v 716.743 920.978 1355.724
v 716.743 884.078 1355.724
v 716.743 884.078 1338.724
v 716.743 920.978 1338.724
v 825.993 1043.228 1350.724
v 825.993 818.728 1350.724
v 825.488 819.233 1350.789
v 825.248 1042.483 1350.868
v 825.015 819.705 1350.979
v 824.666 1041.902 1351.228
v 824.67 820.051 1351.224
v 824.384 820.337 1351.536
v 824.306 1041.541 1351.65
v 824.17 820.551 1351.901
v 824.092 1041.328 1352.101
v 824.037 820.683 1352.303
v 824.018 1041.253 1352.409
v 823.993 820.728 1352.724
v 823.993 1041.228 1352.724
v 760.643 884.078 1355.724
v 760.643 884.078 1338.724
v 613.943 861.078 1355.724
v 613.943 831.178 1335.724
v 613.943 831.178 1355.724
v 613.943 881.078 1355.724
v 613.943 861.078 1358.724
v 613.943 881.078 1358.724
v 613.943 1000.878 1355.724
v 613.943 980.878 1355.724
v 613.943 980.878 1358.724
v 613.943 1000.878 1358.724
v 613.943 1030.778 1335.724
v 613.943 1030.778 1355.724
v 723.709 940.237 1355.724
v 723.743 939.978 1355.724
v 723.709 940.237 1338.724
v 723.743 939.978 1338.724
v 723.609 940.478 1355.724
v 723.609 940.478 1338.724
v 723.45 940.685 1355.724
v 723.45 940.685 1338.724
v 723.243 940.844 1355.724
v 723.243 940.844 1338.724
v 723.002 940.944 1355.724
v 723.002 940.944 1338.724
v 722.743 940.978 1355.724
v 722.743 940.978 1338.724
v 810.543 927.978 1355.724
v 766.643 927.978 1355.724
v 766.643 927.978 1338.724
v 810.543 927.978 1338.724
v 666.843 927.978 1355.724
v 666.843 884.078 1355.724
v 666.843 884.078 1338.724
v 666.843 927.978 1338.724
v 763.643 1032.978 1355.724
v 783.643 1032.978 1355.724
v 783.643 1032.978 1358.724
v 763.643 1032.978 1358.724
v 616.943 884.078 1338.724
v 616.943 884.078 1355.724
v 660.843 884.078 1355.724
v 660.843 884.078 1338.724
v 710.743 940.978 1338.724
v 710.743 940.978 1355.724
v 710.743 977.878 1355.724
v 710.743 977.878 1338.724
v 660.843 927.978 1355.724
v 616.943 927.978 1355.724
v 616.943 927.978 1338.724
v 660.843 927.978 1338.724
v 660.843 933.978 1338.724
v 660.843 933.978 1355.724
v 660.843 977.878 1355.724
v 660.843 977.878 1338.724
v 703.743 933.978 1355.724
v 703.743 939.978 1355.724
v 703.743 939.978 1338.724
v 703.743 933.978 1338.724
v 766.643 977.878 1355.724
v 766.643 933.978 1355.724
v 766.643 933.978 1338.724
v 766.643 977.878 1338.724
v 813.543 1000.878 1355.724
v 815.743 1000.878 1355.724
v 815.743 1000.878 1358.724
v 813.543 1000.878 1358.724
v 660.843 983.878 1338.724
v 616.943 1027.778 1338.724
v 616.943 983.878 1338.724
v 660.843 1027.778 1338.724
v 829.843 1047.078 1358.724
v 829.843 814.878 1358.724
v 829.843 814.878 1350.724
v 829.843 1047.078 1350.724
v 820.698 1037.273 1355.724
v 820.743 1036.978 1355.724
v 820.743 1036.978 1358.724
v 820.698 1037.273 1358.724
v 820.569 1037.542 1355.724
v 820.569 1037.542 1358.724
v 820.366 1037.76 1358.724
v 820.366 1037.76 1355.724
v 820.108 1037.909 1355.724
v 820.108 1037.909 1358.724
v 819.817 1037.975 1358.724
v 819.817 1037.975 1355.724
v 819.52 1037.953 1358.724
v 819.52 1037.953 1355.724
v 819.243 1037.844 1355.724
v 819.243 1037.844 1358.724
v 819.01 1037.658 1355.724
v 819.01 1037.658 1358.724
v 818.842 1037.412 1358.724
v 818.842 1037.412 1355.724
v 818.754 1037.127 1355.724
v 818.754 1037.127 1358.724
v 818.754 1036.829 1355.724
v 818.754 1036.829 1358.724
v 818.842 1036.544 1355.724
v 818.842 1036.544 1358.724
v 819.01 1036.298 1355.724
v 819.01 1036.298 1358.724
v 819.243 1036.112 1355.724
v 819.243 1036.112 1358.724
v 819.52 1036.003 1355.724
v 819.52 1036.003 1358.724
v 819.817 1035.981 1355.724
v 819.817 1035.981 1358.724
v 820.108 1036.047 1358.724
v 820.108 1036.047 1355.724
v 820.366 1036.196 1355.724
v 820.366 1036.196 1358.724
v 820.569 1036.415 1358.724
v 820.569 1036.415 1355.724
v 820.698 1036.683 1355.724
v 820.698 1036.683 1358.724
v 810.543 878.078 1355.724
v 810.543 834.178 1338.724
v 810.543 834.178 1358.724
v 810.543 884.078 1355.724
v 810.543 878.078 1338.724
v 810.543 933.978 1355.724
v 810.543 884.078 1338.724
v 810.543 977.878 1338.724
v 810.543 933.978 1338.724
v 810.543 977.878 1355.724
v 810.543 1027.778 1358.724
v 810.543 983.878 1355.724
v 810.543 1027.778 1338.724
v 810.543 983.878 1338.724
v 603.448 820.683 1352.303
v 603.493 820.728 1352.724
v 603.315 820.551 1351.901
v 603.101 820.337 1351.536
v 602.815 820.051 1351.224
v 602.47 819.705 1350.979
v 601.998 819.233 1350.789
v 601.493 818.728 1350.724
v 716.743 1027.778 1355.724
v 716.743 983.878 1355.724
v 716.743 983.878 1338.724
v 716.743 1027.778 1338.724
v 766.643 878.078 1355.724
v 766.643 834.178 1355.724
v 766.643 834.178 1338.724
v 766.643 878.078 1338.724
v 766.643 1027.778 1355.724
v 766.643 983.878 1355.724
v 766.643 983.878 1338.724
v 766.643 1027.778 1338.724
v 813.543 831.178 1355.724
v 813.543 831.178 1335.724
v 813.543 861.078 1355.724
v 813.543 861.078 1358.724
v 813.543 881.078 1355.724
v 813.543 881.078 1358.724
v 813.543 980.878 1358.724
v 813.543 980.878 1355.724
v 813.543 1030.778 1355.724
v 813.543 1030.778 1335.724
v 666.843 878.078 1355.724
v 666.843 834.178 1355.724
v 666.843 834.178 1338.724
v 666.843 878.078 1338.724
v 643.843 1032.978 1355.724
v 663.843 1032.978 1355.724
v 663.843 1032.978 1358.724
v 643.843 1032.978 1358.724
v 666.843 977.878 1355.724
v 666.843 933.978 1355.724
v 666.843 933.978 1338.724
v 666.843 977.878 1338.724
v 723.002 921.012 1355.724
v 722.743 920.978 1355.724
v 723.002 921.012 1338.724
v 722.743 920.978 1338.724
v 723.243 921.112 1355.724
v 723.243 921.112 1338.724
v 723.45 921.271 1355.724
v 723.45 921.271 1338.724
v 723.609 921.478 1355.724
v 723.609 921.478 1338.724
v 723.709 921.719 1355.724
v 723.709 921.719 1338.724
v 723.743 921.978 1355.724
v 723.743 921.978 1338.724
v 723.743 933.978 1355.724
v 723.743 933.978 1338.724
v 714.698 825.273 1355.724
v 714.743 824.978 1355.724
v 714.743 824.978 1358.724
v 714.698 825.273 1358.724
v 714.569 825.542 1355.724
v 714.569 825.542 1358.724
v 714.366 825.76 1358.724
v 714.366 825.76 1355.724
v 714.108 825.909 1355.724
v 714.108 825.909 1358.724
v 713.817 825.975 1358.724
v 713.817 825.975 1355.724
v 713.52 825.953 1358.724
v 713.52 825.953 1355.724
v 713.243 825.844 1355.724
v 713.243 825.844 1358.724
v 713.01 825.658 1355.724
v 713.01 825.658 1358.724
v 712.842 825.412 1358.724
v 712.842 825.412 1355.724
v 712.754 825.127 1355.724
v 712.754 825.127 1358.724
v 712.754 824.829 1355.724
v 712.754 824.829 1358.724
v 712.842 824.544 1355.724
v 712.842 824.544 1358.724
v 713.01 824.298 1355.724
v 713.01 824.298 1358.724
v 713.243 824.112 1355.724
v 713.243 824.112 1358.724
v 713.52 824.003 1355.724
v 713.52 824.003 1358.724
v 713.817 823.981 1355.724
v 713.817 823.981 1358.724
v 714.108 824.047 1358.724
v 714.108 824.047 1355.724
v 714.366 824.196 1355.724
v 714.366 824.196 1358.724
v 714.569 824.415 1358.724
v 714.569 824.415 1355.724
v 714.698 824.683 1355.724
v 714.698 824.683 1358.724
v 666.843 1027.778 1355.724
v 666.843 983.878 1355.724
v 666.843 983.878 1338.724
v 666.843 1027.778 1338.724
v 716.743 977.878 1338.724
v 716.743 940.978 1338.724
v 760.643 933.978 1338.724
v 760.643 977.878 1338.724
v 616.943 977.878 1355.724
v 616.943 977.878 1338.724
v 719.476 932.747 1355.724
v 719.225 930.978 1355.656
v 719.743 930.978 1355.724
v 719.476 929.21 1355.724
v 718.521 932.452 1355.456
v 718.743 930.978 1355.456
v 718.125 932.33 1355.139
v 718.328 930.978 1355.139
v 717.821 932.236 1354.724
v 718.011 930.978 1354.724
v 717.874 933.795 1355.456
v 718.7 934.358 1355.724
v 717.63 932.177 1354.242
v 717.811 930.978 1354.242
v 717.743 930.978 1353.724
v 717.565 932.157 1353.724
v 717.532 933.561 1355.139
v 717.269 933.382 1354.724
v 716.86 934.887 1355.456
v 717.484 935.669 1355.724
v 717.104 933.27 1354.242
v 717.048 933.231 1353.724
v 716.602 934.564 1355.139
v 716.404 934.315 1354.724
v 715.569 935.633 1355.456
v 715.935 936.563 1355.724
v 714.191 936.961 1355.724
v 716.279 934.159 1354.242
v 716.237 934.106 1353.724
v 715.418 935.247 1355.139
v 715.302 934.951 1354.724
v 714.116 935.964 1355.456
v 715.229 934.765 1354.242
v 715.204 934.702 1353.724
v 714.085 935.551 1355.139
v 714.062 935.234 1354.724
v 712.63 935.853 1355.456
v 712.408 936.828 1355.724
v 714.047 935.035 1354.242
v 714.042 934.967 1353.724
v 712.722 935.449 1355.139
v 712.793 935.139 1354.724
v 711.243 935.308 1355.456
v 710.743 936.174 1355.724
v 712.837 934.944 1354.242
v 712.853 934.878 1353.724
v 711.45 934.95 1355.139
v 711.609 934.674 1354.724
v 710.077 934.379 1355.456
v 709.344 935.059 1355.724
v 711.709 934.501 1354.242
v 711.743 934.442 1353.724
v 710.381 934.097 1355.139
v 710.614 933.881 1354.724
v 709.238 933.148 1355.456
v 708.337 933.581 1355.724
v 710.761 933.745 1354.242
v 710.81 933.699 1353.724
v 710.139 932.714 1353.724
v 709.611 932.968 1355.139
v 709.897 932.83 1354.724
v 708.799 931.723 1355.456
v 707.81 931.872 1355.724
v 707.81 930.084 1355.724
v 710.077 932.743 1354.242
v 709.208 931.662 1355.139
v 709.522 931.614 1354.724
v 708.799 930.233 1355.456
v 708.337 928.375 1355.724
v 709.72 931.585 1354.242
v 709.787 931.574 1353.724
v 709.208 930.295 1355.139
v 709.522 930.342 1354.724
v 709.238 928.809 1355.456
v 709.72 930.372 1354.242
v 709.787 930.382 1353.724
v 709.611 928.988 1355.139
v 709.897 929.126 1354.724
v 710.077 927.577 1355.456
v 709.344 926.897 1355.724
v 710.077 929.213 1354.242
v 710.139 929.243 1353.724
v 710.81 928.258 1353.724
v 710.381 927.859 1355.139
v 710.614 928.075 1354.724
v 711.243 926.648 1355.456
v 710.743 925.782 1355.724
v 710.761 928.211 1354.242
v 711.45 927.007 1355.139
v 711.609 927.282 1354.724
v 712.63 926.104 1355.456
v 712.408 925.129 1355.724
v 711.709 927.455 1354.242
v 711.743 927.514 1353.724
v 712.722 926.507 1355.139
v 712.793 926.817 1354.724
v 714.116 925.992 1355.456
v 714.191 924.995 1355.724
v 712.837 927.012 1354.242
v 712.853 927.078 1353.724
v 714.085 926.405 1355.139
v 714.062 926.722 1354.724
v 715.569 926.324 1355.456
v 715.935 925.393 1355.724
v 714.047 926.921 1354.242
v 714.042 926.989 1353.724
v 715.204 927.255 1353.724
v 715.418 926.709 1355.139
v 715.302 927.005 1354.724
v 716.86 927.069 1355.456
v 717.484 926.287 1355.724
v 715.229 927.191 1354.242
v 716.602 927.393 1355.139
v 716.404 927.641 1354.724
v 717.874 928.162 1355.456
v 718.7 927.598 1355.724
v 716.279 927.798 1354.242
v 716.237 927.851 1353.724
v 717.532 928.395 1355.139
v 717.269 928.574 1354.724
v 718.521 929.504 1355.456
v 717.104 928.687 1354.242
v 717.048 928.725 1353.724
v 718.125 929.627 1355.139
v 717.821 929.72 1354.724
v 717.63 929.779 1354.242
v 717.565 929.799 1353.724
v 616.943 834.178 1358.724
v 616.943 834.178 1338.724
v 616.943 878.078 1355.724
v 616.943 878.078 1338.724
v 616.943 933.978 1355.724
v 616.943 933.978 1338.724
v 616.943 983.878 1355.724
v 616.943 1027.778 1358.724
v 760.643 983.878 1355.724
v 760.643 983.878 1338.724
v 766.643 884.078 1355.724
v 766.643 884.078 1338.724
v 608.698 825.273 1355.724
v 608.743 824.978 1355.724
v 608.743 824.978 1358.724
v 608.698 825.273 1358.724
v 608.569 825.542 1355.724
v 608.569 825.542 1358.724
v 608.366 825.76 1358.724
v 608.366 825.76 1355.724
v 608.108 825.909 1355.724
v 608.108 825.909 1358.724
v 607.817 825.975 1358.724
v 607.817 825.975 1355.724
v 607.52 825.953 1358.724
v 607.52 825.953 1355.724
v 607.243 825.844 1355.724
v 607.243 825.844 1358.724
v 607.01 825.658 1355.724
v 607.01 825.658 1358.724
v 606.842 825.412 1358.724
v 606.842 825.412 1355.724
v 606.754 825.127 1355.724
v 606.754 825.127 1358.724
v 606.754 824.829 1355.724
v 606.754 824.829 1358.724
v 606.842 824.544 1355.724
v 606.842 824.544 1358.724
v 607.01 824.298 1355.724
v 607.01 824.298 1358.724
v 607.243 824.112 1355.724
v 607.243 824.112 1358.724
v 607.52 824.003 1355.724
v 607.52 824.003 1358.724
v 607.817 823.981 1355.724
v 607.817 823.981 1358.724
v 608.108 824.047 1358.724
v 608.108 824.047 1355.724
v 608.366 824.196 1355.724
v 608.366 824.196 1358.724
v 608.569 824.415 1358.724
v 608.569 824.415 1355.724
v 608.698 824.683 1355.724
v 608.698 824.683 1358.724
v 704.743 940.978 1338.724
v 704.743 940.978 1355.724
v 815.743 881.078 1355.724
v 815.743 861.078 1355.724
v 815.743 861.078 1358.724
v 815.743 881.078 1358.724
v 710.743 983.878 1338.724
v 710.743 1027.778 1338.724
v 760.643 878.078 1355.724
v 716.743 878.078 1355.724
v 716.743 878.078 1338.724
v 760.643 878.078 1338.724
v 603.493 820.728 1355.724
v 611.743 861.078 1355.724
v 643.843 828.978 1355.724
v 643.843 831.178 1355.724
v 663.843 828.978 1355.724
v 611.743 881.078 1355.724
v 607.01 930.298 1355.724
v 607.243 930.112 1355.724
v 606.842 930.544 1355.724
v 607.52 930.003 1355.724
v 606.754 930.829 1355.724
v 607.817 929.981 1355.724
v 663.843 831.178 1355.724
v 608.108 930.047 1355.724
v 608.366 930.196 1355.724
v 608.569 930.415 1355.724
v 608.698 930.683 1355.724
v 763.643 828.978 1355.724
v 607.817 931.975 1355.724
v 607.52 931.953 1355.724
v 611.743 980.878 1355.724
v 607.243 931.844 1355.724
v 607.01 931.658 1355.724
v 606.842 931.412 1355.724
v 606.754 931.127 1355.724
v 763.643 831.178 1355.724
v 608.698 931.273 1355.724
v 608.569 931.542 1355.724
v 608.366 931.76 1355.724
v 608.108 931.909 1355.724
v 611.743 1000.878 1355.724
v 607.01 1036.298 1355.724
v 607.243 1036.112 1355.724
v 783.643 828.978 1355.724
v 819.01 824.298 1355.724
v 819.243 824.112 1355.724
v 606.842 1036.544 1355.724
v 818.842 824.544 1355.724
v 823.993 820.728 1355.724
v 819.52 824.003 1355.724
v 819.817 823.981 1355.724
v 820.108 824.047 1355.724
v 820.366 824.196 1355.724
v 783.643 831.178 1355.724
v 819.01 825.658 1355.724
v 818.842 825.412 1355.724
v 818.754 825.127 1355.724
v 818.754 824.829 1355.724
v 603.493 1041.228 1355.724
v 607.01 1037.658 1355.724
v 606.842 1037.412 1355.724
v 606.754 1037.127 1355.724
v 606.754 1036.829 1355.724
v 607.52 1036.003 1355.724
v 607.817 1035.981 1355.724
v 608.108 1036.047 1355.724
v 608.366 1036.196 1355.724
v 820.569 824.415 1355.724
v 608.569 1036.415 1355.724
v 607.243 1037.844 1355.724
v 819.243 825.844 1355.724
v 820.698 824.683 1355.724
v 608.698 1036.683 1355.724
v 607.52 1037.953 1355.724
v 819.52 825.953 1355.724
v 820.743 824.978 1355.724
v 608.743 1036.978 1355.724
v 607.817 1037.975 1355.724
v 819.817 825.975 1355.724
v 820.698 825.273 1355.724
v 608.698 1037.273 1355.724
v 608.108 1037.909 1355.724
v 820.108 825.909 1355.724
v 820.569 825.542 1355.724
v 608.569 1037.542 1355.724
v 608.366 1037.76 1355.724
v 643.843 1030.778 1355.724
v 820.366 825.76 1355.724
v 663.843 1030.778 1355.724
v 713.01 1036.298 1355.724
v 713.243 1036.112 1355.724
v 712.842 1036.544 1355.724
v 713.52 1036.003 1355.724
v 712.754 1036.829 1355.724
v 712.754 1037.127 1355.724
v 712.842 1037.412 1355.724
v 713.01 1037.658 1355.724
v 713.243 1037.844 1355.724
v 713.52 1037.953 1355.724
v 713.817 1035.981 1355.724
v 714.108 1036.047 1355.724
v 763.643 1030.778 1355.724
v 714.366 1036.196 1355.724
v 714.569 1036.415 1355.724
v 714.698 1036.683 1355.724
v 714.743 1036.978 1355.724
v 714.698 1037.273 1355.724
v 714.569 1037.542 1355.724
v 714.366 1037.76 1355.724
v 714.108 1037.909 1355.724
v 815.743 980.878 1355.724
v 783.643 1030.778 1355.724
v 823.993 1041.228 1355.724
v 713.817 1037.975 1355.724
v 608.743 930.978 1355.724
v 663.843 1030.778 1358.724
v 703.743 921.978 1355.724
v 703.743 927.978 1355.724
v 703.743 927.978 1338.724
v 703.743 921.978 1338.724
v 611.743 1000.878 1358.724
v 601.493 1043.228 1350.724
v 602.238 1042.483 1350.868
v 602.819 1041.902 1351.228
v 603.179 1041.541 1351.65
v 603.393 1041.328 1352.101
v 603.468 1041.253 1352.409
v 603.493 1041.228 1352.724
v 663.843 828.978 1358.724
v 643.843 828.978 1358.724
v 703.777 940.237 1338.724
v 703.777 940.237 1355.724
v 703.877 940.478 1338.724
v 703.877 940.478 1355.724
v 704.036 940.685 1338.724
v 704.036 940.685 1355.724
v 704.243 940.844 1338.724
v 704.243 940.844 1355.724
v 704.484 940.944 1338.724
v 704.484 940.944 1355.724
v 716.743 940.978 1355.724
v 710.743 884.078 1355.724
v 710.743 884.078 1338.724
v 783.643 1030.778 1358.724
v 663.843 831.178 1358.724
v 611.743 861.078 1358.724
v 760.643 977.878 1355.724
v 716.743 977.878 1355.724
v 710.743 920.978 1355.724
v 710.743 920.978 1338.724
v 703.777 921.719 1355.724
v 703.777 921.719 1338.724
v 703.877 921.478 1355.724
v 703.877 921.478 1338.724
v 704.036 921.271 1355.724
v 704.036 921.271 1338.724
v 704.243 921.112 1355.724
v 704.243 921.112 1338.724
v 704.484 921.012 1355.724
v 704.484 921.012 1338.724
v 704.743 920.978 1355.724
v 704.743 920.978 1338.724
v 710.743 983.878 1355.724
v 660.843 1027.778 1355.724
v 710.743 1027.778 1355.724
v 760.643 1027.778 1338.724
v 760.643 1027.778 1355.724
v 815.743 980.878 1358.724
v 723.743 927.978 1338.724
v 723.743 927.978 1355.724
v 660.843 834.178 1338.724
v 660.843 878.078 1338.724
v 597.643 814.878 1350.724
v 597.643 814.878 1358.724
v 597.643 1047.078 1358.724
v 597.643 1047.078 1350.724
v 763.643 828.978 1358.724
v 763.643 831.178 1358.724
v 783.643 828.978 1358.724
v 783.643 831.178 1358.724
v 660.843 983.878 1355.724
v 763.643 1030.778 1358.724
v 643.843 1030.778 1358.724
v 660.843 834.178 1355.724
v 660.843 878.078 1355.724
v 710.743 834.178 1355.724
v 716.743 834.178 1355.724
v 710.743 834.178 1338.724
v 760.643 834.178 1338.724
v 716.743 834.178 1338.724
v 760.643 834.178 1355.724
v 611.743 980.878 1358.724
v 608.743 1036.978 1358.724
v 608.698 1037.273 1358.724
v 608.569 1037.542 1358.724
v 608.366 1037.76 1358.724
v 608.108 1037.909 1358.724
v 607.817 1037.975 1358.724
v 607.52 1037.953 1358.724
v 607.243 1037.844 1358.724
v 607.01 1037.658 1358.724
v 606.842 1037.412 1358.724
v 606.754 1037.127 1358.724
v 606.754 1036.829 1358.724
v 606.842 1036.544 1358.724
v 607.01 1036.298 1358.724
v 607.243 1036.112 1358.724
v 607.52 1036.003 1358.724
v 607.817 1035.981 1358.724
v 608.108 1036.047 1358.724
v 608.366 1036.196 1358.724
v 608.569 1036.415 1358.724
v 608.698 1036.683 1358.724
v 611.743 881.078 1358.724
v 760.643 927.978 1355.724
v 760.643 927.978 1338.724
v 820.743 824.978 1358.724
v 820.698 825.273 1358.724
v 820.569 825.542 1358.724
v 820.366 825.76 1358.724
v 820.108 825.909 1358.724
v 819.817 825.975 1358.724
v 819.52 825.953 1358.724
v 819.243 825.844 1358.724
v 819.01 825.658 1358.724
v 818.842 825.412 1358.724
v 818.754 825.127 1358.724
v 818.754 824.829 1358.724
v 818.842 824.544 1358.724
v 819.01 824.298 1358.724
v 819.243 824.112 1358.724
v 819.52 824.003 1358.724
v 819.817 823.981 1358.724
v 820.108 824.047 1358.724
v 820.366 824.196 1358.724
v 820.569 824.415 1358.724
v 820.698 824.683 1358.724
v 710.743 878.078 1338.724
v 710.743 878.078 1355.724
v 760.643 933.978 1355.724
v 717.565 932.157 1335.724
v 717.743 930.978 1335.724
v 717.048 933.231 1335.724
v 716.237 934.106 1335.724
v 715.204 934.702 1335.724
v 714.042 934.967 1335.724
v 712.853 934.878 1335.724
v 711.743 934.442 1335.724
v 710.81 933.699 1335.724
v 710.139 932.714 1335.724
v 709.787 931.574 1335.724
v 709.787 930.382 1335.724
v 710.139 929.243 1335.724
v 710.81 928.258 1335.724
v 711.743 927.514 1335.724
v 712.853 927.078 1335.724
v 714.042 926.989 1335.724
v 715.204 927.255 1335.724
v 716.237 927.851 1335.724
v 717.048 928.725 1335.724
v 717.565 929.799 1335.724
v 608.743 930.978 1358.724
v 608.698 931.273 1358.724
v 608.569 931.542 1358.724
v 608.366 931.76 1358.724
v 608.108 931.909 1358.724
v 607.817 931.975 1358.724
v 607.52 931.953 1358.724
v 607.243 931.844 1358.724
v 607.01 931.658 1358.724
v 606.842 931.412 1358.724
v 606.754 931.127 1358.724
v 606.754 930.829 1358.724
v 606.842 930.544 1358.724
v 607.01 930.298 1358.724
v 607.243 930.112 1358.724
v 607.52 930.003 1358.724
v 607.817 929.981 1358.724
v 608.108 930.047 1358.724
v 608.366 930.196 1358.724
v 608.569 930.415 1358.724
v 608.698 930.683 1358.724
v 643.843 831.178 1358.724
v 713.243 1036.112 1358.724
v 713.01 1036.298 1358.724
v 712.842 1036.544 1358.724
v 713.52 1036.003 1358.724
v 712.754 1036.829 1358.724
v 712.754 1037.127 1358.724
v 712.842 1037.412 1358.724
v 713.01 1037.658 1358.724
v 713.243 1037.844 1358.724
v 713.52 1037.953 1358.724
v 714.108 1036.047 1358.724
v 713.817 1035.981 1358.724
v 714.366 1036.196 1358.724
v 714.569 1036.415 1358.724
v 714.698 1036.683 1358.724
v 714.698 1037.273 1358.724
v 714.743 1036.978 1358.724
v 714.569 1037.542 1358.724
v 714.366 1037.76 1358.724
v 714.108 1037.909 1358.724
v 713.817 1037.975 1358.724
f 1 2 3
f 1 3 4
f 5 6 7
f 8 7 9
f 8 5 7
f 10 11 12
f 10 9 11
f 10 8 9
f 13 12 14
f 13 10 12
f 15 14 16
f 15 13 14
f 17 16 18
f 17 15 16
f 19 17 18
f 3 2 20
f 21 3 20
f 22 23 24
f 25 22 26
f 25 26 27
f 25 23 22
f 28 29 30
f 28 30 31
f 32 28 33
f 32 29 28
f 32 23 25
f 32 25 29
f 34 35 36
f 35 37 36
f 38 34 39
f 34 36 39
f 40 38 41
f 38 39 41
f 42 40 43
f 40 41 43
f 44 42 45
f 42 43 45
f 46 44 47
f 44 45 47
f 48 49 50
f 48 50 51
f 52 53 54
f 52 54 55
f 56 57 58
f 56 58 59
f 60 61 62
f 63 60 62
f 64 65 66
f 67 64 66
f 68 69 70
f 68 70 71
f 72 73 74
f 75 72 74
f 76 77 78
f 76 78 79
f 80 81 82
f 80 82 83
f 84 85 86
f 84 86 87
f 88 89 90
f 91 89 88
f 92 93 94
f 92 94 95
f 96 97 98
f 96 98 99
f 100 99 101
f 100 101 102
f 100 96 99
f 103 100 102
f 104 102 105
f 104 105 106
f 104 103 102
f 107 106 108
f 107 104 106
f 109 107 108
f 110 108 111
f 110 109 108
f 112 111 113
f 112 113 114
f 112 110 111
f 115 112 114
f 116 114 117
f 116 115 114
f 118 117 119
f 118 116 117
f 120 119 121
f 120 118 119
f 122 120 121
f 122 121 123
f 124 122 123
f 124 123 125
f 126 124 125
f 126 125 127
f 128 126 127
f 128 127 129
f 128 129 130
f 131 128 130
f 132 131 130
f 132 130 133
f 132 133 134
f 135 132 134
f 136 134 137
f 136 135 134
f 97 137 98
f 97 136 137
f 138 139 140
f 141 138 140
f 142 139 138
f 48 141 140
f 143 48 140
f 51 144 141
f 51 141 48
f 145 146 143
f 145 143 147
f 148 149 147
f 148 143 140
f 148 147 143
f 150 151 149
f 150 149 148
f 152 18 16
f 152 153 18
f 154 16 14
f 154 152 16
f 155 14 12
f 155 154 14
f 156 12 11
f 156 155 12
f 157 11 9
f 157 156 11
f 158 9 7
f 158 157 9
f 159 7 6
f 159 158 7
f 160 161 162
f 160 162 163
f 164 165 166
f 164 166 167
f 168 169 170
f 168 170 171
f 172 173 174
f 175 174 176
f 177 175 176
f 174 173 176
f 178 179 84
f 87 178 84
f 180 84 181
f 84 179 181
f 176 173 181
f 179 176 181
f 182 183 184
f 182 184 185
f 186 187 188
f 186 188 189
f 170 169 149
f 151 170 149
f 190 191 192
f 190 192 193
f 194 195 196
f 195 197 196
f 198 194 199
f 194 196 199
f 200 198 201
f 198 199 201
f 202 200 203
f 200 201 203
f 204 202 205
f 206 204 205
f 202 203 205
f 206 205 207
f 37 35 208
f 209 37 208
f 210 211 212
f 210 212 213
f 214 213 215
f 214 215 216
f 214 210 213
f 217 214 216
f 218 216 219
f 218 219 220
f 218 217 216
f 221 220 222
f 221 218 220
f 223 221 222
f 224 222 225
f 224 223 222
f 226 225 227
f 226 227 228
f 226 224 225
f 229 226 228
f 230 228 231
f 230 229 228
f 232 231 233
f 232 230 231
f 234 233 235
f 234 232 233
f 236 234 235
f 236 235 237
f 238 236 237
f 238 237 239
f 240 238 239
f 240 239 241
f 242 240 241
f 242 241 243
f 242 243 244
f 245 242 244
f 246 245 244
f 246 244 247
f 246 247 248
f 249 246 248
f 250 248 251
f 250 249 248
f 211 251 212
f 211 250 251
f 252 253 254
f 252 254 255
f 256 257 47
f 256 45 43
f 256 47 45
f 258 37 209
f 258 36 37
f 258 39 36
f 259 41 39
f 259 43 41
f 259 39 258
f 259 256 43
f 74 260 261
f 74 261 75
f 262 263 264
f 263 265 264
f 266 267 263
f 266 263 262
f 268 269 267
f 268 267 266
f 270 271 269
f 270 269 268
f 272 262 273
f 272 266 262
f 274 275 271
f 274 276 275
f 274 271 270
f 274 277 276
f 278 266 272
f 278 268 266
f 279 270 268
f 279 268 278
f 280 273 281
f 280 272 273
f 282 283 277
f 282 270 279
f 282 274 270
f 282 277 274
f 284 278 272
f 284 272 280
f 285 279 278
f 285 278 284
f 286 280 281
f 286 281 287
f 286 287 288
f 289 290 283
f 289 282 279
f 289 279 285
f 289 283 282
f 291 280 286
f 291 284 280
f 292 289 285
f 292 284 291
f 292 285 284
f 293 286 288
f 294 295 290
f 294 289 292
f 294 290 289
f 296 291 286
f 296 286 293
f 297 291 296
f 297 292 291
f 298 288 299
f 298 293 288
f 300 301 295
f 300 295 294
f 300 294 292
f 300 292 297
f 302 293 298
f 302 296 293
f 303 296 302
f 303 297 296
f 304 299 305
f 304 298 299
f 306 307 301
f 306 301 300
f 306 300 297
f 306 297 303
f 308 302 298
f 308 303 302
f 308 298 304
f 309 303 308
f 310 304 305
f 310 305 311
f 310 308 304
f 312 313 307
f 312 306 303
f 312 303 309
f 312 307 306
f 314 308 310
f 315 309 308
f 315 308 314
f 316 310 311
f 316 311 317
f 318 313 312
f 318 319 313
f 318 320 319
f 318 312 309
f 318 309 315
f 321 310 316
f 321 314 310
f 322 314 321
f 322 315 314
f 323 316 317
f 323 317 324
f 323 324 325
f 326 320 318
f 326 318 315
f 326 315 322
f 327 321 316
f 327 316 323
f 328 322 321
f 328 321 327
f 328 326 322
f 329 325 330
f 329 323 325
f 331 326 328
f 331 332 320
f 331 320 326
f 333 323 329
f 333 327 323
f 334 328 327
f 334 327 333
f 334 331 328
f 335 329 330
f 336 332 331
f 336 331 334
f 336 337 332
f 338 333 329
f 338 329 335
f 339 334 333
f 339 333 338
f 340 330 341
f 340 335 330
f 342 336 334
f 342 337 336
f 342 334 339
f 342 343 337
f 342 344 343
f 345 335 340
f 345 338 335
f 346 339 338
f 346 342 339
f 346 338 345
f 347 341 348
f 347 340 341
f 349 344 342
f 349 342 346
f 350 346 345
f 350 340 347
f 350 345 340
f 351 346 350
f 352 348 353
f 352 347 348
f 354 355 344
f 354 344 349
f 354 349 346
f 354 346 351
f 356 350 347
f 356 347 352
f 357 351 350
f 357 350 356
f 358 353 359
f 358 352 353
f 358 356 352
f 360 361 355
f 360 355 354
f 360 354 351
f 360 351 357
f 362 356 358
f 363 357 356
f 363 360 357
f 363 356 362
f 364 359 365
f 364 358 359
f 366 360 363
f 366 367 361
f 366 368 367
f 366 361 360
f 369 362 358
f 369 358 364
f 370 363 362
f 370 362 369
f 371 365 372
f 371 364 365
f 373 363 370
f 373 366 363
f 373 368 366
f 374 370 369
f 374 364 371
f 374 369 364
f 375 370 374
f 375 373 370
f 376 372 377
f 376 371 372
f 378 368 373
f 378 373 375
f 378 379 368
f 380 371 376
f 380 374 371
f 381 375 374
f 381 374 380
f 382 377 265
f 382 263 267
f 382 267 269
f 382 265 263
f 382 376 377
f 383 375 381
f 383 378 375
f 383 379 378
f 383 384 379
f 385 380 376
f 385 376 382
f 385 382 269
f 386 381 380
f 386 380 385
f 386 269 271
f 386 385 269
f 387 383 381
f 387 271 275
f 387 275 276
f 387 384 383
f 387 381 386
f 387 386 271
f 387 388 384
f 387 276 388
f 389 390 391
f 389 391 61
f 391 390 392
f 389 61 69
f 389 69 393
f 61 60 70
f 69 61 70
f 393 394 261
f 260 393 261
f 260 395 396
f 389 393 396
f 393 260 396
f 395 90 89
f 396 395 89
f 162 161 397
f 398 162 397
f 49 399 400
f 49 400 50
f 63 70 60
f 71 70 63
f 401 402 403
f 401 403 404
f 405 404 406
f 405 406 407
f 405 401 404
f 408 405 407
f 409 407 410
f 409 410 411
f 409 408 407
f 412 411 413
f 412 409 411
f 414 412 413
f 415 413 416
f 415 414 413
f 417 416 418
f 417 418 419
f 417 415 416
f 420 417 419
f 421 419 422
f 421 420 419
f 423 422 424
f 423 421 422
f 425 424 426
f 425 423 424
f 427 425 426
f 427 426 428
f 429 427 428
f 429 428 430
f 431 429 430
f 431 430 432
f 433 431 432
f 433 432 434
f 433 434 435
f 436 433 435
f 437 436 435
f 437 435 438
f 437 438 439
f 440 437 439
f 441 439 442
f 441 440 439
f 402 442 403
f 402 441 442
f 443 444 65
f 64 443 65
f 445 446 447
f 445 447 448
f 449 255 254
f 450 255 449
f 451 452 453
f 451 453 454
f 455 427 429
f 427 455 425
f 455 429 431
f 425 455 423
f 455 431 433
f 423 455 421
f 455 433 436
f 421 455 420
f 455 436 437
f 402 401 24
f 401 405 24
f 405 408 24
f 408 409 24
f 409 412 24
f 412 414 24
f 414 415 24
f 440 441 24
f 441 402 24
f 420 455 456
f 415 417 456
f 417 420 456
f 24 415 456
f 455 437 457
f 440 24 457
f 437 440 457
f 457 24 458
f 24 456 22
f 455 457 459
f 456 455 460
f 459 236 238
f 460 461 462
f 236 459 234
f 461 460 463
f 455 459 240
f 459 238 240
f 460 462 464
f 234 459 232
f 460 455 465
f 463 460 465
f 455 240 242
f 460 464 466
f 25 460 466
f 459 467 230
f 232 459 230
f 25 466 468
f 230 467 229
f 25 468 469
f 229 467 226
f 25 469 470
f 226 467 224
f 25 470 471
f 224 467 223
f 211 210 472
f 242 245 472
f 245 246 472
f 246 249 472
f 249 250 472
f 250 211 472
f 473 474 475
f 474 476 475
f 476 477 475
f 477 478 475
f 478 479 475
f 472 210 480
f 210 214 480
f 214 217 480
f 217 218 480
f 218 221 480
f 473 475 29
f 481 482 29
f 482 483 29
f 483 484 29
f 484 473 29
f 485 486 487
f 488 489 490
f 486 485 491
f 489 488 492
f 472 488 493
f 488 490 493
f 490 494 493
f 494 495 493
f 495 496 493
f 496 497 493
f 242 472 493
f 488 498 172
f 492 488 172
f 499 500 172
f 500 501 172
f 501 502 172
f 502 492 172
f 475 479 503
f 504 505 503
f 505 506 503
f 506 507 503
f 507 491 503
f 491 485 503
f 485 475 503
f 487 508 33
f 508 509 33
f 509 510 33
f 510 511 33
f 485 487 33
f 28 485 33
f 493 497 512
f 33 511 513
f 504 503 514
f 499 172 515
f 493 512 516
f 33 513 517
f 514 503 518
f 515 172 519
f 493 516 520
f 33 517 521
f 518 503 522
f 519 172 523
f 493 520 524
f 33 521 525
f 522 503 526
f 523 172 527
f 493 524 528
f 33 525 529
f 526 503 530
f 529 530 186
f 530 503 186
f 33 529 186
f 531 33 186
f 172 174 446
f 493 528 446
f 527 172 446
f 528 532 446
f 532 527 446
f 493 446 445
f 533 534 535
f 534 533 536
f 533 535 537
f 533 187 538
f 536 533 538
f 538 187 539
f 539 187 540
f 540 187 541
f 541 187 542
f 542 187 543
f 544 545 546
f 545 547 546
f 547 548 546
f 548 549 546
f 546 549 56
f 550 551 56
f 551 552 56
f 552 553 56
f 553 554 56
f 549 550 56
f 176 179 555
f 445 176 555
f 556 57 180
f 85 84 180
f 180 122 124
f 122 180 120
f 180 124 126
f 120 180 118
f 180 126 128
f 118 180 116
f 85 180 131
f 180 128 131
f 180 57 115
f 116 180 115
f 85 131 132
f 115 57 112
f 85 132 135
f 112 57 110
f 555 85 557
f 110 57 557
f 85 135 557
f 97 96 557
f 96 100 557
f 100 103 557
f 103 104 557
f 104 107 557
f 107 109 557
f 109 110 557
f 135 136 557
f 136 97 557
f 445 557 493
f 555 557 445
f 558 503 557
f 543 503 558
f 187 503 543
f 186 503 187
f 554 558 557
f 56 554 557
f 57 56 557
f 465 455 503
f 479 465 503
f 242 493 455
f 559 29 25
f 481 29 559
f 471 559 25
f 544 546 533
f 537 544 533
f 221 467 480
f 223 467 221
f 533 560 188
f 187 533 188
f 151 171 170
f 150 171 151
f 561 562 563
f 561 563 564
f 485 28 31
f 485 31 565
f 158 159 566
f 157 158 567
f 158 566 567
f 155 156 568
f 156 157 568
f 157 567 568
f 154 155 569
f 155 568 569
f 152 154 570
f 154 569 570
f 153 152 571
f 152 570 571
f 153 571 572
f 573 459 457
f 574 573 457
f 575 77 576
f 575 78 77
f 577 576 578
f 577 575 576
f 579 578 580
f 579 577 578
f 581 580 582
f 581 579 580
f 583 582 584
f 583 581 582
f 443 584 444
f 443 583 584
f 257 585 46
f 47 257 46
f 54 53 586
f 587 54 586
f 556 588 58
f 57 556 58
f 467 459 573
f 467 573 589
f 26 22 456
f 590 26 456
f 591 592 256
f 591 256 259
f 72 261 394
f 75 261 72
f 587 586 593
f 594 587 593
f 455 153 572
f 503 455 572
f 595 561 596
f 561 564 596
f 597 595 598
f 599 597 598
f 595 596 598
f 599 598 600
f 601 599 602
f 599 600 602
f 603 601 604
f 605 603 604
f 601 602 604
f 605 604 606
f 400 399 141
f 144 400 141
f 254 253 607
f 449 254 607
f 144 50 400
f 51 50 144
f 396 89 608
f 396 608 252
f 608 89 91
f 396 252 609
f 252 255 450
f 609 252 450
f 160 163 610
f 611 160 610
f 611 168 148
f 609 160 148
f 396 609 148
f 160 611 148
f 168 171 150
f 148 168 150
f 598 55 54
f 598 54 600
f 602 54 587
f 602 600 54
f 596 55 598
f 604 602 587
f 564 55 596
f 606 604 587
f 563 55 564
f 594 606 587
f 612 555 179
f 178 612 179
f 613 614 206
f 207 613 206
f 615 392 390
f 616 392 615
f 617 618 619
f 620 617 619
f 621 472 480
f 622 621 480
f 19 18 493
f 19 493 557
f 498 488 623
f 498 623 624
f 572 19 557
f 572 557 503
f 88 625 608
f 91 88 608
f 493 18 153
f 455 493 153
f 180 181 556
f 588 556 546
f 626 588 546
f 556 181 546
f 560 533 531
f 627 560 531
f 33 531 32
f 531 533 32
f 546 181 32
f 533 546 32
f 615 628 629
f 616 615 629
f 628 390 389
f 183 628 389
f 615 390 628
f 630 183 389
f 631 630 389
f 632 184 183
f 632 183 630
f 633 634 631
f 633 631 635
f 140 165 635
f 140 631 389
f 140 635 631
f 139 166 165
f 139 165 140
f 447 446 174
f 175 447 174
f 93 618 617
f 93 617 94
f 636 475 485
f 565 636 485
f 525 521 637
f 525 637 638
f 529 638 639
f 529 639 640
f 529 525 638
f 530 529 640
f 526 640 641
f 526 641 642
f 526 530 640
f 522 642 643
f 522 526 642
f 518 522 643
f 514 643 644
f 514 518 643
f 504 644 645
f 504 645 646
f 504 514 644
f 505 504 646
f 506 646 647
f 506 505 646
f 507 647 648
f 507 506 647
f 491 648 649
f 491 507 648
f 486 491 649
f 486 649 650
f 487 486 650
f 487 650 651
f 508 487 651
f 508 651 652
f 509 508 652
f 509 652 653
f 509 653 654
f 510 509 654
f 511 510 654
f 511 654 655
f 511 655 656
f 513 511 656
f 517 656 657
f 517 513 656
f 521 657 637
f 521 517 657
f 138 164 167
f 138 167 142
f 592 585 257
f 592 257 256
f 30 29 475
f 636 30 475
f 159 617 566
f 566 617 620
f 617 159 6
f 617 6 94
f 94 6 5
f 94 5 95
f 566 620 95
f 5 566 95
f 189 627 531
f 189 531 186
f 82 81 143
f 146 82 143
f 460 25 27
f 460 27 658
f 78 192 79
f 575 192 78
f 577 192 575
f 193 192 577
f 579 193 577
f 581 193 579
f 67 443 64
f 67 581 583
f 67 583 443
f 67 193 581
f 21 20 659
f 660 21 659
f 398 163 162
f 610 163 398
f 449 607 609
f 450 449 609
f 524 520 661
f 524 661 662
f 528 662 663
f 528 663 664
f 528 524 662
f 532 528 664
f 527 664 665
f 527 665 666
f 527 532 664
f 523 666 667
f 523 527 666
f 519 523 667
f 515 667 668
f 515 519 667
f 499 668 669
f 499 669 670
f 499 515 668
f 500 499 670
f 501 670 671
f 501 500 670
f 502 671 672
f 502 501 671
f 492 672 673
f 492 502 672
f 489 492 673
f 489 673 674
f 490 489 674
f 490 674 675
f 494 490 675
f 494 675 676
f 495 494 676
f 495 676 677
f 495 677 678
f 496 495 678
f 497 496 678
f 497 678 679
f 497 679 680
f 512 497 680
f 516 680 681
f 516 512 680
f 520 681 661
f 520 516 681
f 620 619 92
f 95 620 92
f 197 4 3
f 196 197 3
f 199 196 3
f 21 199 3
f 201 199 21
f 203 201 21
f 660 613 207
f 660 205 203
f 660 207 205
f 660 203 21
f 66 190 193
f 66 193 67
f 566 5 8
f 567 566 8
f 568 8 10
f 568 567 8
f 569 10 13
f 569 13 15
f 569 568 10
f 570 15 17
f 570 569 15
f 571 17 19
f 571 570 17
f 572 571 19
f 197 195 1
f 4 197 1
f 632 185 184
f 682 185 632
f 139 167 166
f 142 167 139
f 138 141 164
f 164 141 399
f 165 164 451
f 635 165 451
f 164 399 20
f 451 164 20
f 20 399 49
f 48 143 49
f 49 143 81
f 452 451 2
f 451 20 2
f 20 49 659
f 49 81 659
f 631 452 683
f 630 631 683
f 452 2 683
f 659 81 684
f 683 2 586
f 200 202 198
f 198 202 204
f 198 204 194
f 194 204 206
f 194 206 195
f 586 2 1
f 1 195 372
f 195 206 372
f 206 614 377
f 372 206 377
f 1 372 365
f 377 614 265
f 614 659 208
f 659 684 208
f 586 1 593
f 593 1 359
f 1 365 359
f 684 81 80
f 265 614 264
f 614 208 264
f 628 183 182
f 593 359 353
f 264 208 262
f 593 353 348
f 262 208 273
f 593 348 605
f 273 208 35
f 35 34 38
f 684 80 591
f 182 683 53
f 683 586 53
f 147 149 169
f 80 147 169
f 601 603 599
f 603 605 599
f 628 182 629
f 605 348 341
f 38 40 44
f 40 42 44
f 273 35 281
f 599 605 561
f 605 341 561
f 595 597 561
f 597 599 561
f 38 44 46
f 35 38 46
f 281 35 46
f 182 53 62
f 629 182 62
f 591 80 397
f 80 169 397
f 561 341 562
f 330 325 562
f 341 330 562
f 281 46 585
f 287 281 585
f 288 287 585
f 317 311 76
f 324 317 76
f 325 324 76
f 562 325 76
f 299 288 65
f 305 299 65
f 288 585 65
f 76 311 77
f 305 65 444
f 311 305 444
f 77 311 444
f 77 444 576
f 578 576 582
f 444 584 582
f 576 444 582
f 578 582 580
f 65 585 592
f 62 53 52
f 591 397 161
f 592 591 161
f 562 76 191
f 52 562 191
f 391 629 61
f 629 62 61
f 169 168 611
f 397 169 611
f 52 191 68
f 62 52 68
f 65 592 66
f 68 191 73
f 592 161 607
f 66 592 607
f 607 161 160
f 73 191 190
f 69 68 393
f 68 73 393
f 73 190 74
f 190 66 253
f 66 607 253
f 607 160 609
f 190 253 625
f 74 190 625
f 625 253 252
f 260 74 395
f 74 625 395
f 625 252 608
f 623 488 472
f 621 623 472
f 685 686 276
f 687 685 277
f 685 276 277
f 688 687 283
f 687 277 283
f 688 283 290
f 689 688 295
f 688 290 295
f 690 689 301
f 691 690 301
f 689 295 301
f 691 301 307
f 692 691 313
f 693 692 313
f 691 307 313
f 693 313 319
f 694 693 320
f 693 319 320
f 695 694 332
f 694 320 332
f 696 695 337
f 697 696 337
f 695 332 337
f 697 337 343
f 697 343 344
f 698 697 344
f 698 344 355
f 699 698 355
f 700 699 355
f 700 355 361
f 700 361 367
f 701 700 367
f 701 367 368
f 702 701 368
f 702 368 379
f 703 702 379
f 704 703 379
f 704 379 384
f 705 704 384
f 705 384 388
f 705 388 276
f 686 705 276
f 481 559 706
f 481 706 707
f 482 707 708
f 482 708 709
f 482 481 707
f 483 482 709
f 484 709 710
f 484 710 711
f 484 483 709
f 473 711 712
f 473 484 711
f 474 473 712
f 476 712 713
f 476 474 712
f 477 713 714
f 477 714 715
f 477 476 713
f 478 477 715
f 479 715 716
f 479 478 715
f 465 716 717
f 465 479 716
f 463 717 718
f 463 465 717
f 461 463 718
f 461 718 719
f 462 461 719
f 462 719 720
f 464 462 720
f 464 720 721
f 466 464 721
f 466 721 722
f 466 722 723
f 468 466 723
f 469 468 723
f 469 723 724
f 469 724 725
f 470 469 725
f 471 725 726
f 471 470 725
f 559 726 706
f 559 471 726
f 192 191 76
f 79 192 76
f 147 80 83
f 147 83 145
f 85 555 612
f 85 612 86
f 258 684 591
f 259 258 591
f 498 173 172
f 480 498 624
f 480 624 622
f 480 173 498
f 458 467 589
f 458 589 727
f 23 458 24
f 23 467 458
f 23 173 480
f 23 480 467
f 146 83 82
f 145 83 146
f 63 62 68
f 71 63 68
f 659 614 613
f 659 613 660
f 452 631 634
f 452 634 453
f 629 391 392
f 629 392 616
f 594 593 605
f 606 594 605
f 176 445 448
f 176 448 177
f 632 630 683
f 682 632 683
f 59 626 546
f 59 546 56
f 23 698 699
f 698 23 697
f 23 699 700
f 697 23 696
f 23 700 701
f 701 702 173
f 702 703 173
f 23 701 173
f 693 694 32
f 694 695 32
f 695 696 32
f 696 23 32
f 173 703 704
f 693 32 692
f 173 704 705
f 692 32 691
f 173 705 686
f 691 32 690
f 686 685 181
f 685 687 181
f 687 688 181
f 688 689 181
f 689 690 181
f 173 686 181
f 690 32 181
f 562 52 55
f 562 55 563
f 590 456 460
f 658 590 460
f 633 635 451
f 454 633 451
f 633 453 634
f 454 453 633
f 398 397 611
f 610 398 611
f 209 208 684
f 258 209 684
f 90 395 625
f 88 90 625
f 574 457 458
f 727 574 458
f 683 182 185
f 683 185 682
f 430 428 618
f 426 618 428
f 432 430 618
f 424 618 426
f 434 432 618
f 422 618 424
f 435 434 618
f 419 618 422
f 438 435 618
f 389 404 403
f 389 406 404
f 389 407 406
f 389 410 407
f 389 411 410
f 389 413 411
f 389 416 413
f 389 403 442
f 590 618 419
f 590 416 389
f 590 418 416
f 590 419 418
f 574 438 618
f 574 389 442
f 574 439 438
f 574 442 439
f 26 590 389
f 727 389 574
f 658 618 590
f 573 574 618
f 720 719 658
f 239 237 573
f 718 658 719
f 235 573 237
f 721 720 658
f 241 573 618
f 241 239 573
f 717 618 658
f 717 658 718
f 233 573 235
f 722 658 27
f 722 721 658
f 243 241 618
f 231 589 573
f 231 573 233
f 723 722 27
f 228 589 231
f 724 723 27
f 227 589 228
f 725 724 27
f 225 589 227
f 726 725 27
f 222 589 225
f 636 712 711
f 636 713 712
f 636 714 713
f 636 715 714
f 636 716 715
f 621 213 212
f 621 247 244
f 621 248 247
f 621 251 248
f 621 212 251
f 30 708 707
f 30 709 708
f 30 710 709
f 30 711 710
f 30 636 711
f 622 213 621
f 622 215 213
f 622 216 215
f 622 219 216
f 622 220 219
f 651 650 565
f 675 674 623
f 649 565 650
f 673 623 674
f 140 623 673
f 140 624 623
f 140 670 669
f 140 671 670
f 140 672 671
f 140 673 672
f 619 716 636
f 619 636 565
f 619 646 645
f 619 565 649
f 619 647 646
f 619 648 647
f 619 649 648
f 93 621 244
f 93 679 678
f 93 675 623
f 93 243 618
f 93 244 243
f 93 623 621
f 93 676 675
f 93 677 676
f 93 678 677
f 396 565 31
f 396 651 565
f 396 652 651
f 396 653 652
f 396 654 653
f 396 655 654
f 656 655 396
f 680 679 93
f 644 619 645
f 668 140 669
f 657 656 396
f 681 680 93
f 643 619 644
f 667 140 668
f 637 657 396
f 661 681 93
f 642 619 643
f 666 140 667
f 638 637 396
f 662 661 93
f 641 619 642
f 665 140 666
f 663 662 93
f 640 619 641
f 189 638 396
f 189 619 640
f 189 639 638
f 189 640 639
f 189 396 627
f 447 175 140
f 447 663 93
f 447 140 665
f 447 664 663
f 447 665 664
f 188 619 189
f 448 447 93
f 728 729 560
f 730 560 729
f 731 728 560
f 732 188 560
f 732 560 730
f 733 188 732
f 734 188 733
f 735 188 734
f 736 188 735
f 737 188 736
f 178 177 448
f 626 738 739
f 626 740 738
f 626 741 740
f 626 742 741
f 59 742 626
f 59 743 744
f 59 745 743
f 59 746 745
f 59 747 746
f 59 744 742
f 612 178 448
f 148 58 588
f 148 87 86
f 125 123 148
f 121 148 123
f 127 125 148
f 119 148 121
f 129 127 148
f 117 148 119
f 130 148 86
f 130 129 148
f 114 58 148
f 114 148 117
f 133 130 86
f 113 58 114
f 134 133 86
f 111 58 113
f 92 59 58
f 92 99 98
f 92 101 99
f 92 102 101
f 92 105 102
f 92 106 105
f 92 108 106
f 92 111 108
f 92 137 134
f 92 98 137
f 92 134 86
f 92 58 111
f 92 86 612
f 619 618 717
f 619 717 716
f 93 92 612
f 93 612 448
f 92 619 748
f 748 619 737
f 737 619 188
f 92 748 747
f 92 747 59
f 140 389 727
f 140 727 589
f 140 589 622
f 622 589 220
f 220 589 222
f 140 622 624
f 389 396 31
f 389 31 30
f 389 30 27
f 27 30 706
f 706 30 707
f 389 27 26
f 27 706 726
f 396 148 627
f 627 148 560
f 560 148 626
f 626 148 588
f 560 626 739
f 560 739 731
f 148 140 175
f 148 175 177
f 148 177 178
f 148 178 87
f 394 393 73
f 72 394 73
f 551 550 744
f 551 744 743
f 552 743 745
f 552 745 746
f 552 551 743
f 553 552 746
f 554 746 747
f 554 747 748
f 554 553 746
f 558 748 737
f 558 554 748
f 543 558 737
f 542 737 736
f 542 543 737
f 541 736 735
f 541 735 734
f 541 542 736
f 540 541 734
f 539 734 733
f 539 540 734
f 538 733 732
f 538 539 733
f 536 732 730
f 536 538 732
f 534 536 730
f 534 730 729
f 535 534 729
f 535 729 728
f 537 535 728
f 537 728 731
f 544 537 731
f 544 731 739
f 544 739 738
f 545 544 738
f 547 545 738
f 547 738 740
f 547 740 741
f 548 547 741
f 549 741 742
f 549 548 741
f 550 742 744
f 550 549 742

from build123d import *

# Parameters (mm, degrees)
SKETCH1_W           = 199.6
SKETCH1_H           = 199.6
BOSS_EXTRUDE1_DEPTH = 20
SKETCH2_W           = 226.2
SKETCH2_H           = 226.2
SKETCH2_W_2         = 220.2
SKETCH2_H_2         = 220.2
BOSS_EXTRUDE2_DEPTH = 5
SKETCH3_W           = 43.9
SKETCH3_H           = 43.9
CUT_EXTRUDE2_DEPTH  = 17
SKETCH4_W           = 226.2
SKETCH4_H           = 226.2
SKETCH4_R           = 1
SKETCH4_W_2         = 193.6
SKETCH4_H_2         = 193.6
BOSS_EXTRUDE3_DEPTH = 3
SKETCH5_W           = 20
SKETCH5_H           = 2.2
SKETCH5_W_2         = 2.2
SKETCH5_H_2         = 20
CUT_EXTRUDE3_DEPTH  = 1332.979018481
SKETCH6_W           = 232.2
SKETCH6_H           = 232.2
SKETCH6_W_2         = 226.2
SKETCH6_H_2         = 226.2
BOSS_EXTRUDE4_DEPTH = 8
BOSS_EXTRUDE5_DEPTH = 20
SKETCH8_R           = 4
CUT_EXTRUDE4_DEPTH  = 1337.192961728
FILLET1_R           = 2
FILLET2_R           = 1
SKETCH9_W           = 220.5
SKETCH9_H           = 220.5
SKETCH9_W_2         = 199.6
SKETCH9_H_2         = 199.6
CUT_EXTRUDE5_DEPTH  = 5
FILLET4_R           = 2


with BuildPart() as part:
    # Sketch1 → Boss-Extrude1 (new body)
    with BuildSketch(Plane.XY.offset(1355.724355858)):
        with Locations((713.742691035, 930.978191495)):
            Rectangle(SKETCH1_W, SKETCH1_H)
    extrude(amount=-BOSS_EXTRUDE1_DEPTH)

    # Sketch3 → Cut-Extrude2 (cut)
    with BuildSketch(Plane.XY.offset(1355.724355858)):
        with Locations((638.892691035, 906.028191495)):
            Rectangle(SKETCH3_W, SKETCH3_H)
        with Locations((638.892691035, 955.928191495)):
            Rectangle(SKETCH3_W, SKETCH3_H)
        with Locations((638.892691035, 856.128191495)):
            Rectangle(SKETCH3_W, SKETCH3_H)
        with Locations((788.592691035, 856.128191495)):
            Rectangle(SKETCH3_W, SKETCH3_H)
        with Locations((788.592691035, 1005.828191495)):
            Rectangle(SKETCH3_W, SKETCH3_H)
        with Locations((638.892691035, 1005.828191495)):
            Rectangle(SKETCH3_W, SKETCH3_H)
        with Locations((688.792691035, 1005.828191495)):
            Rectangle(SKETCH3_W, SKETCH3_H)
        with Locations((738.692691035, 1005.828191495)):
            Rectangle(SKETCH3_W, SKETCH3_H)
        with Locations((738.692691035, 955.928191495)):
            Rectangle(SKETCH3_W, SKETCH3_H)
        with Locations((688.792691035, 906.028191495)):
            Rectangle(SKETCH3_W, SKETCH3_H)
        with Locations((738.692691035, 906.028191495)):
            Rectangle(SKETCH3_W, SKETCH3_H)
        with Locations((688.792691035, 955.928191495)):
            Rectangle(SKETCH3_W, SKETCH3_H)
        with Locations((788.592691035, 955.928191495)):
            Rectangle(SKETCH3_W, SKETCH3_H)
        with Locations((738.692691035, 856.128191495)):
            Rectangle(SKETCH3_W, SKETCH3_H)
        with Locations((788.592691035, 906.028191495)):
            Rectangle(SKETCH3_W, SKETCH3_H)
        with Locations((688.792691035, 856.128191495)):
            Rectangle(SKETCH3_W, SKETCH3_H)
    extrude(amount=-CUT_EXTRUDE2_DEPTH, mode=Mode.SUBTRACT)



with BuildPart() as body_2:
    # Sketch2 → Boss-Extrude2 (new body)
    with BuildSketch(Plane.XY.offset(1355.724355858)):
        with Locations((713.742691035, 930.978191495)):
            Rectangle(SKETCH2_W, SKETCH2_H)
        with Locations((713.742691035, 930.978191495)):
            Rectangle(SKETCH2_W_2, SKETCH2_H_2, mode=Mode.SUBTRACT)
    extrude(amount=-BOSS_EXTRUDE2_DEPTH)


with BuildPart() as part_1:
    add(part.part)

    add(body_2.part)  # Boss-Extrude3 merges body 2
    # Sketch4 → Boss-Extrude3 (add)
    with BuildSketch(Plane.XY.offset(1355.724355858)):
        with Locations((713.742691035, 930.978191495)):
            Rectangle(SKETCH4_W, SKETCH4_H)
        with Locations((607.742691035, 1036.978191495)):
            Circle(SKETCH4_R, mode=Mode.SUBTRACT)
        with Locations((713.742691035, 1036.978191495)):
            Circle(SKETCH4_R, mode=Mode.SUBTRACT)
        with Locations((819.742691035, 1036.978191495)):
            Circle(SKETCH4_R, mode=Mode.SUBTRACT)
        with Locations((607.742691035, 930.978191495)):
            Circle(SKETCH4_R, mode=Mode.SUBTRACT)
        with Locations((607.742691035, 824.978191495)):
            Circle(SKETCH4_R, mode=Mode.SUBTRACT)
        with Locations((713.742691035, 824.978191495)):
            Circle(SKETCH4_R, mode=Mode.SUBTRACT)
        with Locations((819.742691035, 824.978191495)):
            Circle(SKETCH4_R, mode=Mode.SUBTRACT)
        with Locations((713.742691035, 930.978191495)):
            Rectangle(SKETCH4_W_2, SKETCH4_H_2, mode=Mode.SUBTRACT)
    extrude(amount=BOSS_EXTRUDE3_DEPTH)

    # Sketch5 → Cut-Extrude3 (cut, through all)
    with BuildSketch(Plane(origin=(0, 0, 1355.724355858), x_dir=(-1, 0, 0), z_dir=(0, 0, -1))):
        with Locations((-773.642691035, 1031.878191495)):
            Rectangle(SKETCH5_W, SKETCH5_H)
        with Locations((-773.642691035, 830.078191495)):
            Rectangle(SKETCH5_W, SKETCH5_H)
        with Locations((-653.842691035, 830.078191495)):
            Rectangle(SKETCH5_W, SKETCH5_H)
        with Locations((-653.842691035, 1031.878191495)):
            Rectangle(SKETCH5_W, SKETCH5_H)
        with Locations((-814.642691035, 871.078191495)):
            Rectangle(SKETCH5_W_2, SKETCH5_H_2)
        with Locations((-814.642691035, 990.878191495)):
            Rectangle(SKETCH5_W_2, SKETCH5_H_2)
        with Locations((-612.842691035, 990.878191495)):
            Rectangle(SKETCH5_W_2, SKETCH5_H_2)
        with Locations((-612.842691035, 871.078191495)):
            Rectangle(SKETCH5_W_2, SKETCH5_H_2)
    extrude(amount=-CUT_EXTRUDE3_DEPTH, mode=Mode.SUBTRACT)

    # Sketch6 → Boss-Extrude4 (add)
    with BuildSketch(Plane.XY.offset(1358.724355858)):
        with Locations((713.742691035, 930.978191495)):
            Rectangle(SKETCH6_W, SKETCH6_H)
        with Locations((713.742691035, 930.978191495)):
            Rectangle(SKETCH6_W_2, SKETCH6_H_2, mode=Mode.SUBTRACT)
    extrude(amount=-BOSS_EXTRUDE4_DEPTH)

    # Sketch7 → Boss-Extrude5 (add)
    with BuildSketch(Plane.XY.offset(1355.724355858)):
        Polygon((703.742691035, 930.978191495), (703.742691035, 940.978191495), (723.742691035, 940.978191495), (723.742691035, 920.978191495), (703.742691035, 920.978191495), align=None)
    extrude(amount=-BOSS_EXTRUDE5_DEPTH)

    # Sketch8 → Cut-Extrude4 (cut, through all)
    with BuildSketch(Plane.XY.offset(1355.724355858)):
        with Locations((713.742691035, 930.978191495)):
            Circle(SKETCH8_R)
    extrude(amount=-CUT_EXTRUDE4_DEPTH, mode=Mode.SUBTRACT)

    # Fillet1
    fillet1_edges = [part_1.edges().sort_by_distance(p)[0] for p in [
        (709.742691035, 930.978191495, 1355.724355858),
    ]]
    fillet(fillet1_edges, radius=FILLET1_R)

    # Fillet2
    fillet2_edges = [part_1.edges().sort_by_distance(p)[0] for p in [
        (703.742691035, 940.978191495, 1347.224355858),
        (723.742691035, 940.978191495, 1347.224355858),
        (723.742691035, 920.978191495, 1347.224355858),
        (703.742691035, 920.978191495, 1347.224355858),
    ]]
    fillet(fillet2_edges, radius=FILLET2_R)

    # Sketch9 → Cut-Extrude5 (cut)
    with BuildSketch(Plane(origin=(0, 0, 1350.724355858), x_dir=(-1, 0, 0), z_dir=(0, 0, -1))):
        with Locations((-713.742691035, 930.978191495)):
            Rectangle(SKETCH9_W, SKETCH9_H)
        with Locations((-713.742691035, 930.978191495)):
            Rectangle(SKETCH9_W_2, SKETCH9_H_2, mode=Mode.SUBTRACT)
    extrude(amount=-CUT_EXTRUDE5_DEPTH, mode=Mode.SUBTRACT)

    # Fillet4
    fillet4_edges = [part_1.edges().sort_by_distance(p)[0] for p in [
        (713.742691035, 820.728191495, 1350.724355858),
        (603.492691035, 930.978191495, 1350.724355858),
        (713.742691035, 1041.228191495, 1350.724355858),
        (823.992691035, 930.978191495, 1350.724355858),
    ]]
    fillet(fillet4_edges, radius=FILLET4_R)


solid = part_1.part
